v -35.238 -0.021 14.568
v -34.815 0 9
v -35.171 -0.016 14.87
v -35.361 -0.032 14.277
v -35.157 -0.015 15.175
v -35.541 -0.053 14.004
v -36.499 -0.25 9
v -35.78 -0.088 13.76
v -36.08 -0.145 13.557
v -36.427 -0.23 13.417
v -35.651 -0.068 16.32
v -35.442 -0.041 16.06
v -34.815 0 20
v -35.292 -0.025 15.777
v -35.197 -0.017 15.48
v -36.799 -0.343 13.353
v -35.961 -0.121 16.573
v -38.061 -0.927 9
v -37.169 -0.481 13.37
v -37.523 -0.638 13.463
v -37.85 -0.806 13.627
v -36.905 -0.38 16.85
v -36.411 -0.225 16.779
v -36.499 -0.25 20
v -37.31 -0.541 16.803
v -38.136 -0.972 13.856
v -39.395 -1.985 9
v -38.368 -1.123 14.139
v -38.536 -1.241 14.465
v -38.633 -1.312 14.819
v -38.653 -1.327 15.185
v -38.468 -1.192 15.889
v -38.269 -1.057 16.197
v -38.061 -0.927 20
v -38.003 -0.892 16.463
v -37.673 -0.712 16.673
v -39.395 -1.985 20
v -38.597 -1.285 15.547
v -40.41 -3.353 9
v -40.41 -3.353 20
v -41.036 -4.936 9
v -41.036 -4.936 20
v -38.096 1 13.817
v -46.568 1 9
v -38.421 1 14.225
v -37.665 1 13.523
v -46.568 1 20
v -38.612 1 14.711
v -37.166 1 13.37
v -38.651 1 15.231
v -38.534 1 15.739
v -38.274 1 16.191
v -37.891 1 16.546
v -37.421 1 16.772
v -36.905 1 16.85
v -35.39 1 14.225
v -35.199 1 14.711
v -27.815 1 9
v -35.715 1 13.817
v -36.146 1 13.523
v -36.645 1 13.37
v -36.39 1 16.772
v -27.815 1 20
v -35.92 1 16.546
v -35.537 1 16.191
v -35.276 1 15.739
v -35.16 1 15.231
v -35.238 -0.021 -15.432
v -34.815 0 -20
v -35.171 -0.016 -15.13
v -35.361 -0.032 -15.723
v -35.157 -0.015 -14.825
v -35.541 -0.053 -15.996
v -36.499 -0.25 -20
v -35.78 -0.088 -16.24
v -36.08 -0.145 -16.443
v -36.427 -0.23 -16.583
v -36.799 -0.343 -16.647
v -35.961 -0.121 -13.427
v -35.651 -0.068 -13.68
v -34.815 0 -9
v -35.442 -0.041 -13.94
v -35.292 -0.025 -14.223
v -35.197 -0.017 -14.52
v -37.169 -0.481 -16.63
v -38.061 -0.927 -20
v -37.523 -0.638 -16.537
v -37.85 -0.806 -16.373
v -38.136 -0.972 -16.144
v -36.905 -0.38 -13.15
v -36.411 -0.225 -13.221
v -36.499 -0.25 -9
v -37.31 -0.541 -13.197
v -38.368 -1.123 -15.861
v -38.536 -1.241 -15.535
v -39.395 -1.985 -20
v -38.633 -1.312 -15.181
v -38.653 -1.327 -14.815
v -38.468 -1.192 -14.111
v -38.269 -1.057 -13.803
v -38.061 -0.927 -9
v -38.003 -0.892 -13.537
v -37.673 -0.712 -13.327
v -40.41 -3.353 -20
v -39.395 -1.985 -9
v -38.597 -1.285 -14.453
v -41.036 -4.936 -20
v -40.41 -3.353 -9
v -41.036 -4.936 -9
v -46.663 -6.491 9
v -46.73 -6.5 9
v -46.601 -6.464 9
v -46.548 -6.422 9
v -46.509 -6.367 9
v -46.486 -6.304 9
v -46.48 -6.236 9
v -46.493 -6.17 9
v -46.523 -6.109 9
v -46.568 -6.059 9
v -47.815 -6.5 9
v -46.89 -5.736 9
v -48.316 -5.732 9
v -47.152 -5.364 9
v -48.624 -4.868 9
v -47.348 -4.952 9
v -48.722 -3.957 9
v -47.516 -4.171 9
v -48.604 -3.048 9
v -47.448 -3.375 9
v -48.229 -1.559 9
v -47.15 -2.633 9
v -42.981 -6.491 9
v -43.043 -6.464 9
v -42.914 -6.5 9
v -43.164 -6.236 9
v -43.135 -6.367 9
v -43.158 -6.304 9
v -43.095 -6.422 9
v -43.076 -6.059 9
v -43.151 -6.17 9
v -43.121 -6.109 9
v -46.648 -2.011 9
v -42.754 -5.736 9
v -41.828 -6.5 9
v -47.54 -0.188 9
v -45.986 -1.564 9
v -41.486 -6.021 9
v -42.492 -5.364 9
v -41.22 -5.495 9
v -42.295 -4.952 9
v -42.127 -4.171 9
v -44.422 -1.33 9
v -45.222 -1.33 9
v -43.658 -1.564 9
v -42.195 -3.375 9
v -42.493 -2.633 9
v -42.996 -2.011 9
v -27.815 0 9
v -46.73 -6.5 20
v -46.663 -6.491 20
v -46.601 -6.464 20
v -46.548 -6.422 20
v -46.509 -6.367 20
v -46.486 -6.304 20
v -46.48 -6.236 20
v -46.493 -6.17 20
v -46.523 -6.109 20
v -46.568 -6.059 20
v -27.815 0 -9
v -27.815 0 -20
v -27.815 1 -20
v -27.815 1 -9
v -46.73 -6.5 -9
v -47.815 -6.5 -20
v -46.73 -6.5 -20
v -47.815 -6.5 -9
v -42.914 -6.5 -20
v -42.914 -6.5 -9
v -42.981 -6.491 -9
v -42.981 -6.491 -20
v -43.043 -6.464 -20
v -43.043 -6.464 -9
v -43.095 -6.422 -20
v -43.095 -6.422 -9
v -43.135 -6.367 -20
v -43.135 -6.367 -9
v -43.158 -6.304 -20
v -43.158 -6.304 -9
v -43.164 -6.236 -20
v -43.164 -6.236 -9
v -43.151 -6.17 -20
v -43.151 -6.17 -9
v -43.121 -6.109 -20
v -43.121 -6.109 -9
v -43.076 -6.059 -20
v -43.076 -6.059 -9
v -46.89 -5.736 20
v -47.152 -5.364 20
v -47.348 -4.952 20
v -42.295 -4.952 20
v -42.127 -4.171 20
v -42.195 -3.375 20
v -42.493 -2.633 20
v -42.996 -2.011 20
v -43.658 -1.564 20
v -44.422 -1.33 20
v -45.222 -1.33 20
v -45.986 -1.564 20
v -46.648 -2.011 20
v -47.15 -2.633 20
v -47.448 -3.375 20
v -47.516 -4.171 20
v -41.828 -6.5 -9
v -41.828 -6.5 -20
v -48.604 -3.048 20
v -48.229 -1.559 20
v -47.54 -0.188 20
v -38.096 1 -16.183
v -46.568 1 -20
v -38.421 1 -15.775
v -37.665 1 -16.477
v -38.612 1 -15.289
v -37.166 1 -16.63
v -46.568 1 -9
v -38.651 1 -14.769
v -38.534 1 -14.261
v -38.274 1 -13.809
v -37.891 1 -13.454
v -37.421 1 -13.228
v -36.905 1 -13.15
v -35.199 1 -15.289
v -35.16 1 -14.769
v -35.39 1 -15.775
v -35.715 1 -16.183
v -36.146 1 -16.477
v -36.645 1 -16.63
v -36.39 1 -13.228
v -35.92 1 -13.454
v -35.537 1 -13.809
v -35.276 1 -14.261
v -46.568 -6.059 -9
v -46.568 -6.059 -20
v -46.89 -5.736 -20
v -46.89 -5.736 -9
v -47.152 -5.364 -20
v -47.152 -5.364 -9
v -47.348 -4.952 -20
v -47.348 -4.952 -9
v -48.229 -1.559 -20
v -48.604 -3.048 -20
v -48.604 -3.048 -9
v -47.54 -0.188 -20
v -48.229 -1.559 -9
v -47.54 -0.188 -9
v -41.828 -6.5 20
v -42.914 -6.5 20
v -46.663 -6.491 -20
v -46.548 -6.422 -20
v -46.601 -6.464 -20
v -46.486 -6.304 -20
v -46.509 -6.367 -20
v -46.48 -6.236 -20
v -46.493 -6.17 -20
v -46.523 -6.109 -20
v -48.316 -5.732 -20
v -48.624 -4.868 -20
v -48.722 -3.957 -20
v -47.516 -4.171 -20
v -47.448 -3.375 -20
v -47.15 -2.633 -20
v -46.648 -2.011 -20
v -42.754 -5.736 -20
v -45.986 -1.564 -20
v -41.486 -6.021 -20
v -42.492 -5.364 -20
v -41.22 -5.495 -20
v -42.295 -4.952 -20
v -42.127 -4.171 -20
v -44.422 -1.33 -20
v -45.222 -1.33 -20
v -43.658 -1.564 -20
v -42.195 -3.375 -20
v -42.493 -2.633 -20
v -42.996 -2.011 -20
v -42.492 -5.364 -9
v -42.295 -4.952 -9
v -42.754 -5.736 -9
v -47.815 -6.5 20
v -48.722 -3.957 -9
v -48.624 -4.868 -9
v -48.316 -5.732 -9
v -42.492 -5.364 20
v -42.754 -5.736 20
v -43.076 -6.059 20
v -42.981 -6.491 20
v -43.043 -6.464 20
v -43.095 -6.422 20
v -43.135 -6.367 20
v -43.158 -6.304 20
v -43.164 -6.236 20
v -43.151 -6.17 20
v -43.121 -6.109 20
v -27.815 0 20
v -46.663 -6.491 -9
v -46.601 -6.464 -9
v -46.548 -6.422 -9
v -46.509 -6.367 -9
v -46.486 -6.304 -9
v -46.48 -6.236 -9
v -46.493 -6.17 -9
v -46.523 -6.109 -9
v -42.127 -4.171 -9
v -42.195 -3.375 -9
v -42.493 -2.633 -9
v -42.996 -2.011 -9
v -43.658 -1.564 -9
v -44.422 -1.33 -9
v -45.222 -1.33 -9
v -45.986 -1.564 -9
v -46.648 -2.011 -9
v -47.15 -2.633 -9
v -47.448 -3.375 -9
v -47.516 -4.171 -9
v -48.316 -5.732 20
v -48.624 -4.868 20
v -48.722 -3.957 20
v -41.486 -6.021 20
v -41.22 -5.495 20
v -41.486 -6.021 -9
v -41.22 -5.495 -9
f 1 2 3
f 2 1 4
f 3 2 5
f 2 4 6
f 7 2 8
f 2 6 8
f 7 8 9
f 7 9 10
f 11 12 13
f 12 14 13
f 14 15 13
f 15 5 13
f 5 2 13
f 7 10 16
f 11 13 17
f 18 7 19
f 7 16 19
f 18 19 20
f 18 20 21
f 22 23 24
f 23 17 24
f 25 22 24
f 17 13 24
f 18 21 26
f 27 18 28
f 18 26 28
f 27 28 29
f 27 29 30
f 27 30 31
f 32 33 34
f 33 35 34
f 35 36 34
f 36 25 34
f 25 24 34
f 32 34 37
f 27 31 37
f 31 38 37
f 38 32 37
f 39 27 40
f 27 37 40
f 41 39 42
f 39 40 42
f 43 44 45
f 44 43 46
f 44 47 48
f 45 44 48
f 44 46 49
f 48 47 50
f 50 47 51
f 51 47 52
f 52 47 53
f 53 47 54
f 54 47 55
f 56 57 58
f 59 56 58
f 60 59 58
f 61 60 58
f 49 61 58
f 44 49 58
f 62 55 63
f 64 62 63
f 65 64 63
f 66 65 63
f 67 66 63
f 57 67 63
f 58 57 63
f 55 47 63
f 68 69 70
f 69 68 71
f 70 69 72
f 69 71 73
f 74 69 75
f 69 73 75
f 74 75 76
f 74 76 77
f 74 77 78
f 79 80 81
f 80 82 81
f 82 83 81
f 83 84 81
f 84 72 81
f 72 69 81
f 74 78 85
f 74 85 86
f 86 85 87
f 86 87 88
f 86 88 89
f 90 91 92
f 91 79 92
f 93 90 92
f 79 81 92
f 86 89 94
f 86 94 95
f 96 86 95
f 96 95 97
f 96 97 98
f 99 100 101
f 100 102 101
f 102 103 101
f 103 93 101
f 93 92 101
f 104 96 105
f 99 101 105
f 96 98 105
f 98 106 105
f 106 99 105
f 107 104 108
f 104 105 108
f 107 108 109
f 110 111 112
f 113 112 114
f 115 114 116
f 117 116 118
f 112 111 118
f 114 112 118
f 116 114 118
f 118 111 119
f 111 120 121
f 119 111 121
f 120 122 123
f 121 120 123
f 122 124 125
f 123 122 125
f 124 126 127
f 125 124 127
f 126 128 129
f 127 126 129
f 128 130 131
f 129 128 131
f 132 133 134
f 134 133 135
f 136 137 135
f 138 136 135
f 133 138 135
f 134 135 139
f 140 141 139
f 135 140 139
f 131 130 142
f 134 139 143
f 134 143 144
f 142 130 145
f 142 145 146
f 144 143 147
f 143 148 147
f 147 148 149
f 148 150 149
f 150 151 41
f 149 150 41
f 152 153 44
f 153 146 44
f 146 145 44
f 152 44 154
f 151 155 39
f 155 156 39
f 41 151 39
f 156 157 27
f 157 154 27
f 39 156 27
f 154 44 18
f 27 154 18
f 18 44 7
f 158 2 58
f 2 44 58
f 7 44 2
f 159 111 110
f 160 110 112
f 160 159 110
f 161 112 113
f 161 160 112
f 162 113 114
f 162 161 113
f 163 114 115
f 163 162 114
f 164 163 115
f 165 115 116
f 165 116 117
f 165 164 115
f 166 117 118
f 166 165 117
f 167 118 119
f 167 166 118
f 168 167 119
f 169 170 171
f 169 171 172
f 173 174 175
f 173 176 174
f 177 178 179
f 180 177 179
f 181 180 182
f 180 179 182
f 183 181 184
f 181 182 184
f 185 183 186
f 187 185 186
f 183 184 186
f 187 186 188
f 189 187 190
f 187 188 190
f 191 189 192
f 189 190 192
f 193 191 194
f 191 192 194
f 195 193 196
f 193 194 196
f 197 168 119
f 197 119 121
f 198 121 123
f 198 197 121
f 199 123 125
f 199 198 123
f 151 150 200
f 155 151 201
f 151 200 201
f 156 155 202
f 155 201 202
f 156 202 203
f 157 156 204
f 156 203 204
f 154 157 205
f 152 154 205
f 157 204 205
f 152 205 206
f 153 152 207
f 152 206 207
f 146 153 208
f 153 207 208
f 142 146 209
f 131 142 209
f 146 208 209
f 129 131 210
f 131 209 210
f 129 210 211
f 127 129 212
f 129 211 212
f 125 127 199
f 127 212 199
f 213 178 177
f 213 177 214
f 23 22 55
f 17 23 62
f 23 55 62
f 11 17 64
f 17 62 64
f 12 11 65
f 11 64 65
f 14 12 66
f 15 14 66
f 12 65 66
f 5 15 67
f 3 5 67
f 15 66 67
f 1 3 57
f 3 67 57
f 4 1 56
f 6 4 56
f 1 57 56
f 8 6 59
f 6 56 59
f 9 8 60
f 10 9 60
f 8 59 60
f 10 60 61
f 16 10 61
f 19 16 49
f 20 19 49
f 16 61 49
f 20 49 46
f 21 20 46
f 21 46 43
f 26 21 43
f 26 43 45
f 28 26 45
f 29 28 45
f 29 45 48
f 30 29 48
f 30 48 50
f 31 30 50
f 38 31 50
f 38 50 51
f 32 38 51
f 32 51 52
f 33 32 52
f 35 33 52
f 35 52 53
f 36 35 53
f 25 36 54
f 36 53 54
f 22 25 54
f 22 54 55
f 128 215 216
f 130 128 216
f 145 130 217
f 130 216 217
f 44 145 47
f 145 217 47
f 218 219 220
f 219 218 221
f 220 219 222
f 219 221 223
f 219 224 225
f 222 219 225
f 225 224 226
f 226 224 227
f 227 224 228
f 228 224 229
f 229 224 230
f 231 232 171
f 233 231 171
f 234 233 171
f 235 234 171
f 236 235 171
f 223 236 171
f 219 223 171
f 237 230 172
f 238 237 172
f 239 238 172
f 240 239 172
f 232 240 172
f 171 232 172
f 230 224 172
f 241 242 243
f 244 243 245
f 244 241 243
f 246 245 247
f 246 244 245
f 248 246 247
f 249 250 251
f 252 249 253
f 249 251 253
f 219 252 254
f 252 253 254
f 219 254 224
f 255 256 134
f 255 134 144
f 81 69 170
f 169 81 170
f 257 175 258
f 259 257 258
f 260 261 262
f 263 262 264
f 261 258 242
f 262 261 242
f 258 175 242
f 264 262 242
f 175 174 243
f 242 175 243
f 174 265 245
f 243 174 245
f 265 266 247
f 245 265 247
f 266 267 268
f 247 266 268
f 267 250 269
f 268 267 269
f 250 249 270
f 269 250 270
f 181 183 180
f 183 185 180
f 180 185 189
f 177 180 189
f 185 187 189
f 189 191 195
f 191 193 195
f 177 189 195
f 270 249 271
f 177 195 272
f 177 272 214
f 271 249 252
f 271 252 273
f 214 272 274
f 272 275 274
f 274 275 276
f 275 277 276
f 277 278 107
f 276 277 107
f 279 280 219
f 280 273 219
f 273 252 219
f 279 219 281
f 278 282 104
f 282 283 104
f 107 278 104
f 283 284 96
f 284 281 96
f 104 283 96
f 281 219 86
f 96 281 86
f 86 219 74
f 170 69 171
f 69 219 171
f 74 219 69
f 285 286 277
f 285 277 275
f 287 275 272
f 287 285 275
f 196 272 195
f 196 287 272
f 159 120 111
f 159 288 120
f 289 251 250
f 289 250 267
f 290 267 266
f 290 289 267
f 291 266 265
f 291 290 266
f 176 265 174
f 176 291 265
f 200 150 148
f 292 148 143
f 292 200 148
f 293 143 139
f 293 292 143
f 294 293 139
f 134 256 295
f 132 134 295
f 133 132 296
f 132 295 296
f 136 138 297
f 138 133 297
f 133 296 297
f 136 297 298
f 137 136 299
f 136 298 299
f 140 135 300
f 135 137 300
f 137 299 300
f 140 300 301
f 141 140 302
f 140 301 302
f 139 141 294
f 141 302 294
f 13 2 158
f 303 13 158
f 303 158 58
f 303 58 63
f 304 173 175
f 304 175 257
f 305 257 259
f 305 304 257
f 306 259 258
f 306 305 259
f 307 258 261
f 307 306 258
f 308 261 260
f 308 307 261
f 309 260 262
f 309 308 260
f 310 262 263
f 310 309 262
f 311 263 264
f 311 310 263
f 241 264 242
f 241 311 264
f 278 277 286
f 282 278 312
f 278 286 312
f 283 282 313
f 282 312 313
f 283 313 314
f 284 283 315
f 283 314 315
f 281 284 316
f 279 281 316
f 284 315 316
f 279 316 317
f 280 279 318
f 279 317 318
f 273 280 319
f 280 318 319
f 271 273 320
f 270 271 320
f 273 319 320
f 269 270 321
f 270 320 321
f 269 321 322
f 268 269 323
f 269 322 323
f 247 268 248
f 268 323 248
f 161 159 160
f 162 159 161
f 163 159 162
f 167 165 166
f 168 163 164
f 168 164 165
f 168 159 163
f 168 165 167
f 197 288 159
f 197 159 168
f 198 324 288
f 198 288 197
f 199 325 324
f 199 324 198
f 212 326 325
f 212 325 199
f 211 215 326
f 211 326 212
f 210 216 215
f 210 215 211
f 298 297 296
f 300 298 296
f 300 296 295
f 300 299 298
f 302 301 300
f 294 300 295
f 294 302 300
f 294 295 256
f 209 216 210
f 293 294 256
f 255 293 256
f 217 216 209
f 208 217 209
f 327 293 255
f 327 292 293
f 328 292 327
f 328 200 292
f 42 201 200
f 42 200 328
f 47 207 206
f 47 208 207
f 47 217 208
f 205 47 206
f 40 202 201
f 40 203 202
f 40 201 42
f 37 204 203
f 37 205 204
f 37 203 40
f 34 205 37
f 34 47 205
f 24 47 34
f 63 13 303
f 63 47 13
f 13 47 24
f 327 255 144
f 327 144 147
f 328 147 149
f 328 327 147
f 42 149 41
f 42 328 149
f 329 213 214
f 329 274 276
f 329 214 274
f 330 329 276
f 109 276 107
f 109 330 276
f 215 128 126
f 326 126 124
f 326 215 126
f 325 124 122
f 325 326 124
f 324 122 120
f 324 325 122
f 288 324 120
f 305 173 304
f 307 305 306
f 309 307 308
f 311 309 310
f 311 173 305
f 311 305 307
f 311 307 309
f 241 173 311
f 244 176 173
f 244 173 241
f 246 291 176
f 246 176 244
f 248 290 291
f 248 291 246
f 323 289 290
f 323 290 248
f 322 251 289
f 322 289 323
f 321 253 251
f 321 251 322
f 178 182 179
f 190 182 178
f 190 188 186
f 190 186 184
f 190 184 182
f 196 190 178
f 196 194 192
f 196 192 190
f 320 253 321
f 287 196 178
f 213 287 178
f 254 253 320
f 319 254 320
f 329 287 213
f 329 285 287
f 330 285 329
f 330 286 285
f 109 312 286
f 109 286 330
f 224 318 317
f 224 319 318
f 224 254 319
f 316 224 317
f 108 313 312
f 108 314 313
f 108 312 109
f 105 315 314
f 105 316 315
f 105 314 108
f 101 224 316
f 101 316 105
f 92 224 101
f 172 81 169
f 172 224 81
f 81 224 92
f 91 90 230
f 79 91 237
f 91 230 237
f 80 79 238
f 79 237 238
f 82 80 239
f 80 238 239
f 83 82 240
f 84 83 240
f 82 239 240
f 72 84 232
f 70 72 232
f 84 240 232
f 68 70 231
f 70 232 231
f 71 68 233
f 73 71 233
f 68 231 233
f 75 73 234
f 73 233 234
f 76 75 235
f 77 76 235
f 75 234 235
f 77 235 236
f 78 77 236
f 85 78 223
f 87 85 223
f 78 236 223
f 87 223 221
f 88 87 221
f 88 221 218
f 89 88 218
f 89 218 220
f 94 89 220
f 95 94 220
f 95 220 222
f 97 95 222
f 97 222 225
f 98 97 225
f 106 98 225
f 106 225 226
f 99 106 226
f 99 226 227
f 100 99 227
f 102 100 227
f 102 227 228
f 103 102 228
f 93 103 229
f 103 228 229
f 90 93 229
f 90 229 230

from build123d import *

# Parameters (mm, degrees)
EXTRUDE_1_DEPTH                            = 3.9
EXTRUDE_3_DEPTH                            = 20
EXTRUDE_5_DEPTH                            = 20
FILLET_1_R                                 = 0.25
FILLET_1_OF_MIRROR_2_R                     = 0.25
SKETCH_7_R                                 = 5.5
CUT_EXTRUDE_3_DEPTH                        = 69.146236458
MIRROR_3_AT_THE_SECOND_PLANE_COPY_1_SKET_R = 5.5
MIRROR_3_AT_THE_SECOND_PLANE_COPY_1_DEPTH  = 69.146236458
ESQUISSE1_W                                = 44.6
ESQUISSE1_H                                = 40
ENL_V_MAT_EXTRU_1_DEPTH                    = 1.54
ENL_V_MAT_EXTRU_2_DEPTH                    = 57.761068742
ESQUISSE3_W                                = 50
ESQUISSE3_H                                = 1.36
ENL_V_MAT_EXTRU_3_DEPTH                    = 64.372466761
ESQUISSE4_W                                = 27.815449133
ESQUISSE4_H                                = 40
ENL_V_MAT_EXTRU_4_DEPTH                    = 54.066651895
ESQUISSE5_R                                = 1.75
ENL_V_MAT_EXTRU_5_DEPTH                    = 54.198396436
ESQUISSE6_W                                = 25
ESQUISSE6_H                                = 18
ENL_V_MAT_EXTRU_6_DEPTH                    = 54.198396473


with BuildPart() as part:
    # Эскиз1 → Бобышка-Вытянуть1 (new body)
    with BuildSketch(Plane(origin=(0, 0, 0), x_dir=(1, 0, 0), z_dir=(0, 1, 0))):
        with BuildLine():
            ThreePointArc((-44.6, -23.2), (-43.428427125, -26.028427125), (-40.6, -27.2))
            Line((-40.6, -27.2), (40.6, -27.2))
            ThreePointArc((40.6, -27.2), (43.428427125, -26.028427125), (44.6, -23.2))
            Line((44.6, -23.2), (44.6, 23.2))
            ThreePointArc((44.6, 23.2), (43.428427125, 26.028427125), (40.6, 27.2))
            Line((40.6, 27.2), (33.6, 27.2))
            Line((33.6, 27.2), (-5.4, 27.2))
            Line((-5.4, 27.2), (-40.6, 27.2))
            ThreePointArc((-40.6, 27.2), (-43.428427125, 26.028427125), (-44.6, 23.2))
            Line((-44.6, 23.2), (-44.6, -23.2))
        make_face()
    extrude(amount=EXTRUDE_1_DEPTH)



with BuildPart() as body_2:
    # Эскиз3 → Бобышка-Вытянуть3 (new, symmetric)
    with BuildSketch(Plane.XY):
        with BuildLine():
            Line((-47.815262386, -6.499919999), (-45.841869662, -6.499919999))
            ThreePointArc((-45.841869662, -6.499919999), (-44.821869662, -1.3), (-43.801869662, -6.499919999))
            Line((-43.801869662, -6.499919999), (-41.828476938, -6.499919999))
            ThreePointArc((-41.828476938, -6.499919999), (-44.821869662, -0.1), (-47.815262386, -6.499919999))
        make_face()
    extrude_3 = extrude(amount=EXTRUDE_3_DEPTH, both=True)


with BuildPart() as part_1:
    add(part.part)

    add(body_2.part)  # Бобышка-Вытянуть5 merges body 2
    # Эскиз5 → Бобышка-Вытянуть5 (add, symmetric)
    with BuildSketch(Plane.XY):
        with BuildLine():
            ThreePointArc((-41.631827579, 2.999901942), (-46.932438451, 0.61464415), (-48.60377877, -4.952451312))
            Line((-48.60377877, -4.952451312), (-47.348297278, -4.952451312))
            ThreePointArc((-47.348297278, -4.952451312), (-44.821869662, -1.3), (-42.295442046, -4.952451312))
            Line((-42.295442046, -4.952451312), (-41.039960555, -4.952451312))
            ThreePointArc((-41.039960555, -4.952451312), (-38.684888017, -1.351535806), (-34.6, 0))
            Line((-34.6, 0), (-36.641600827, 0.870983001))
            ThreePointArc((-36.641600827, 0.870983001), (-38.922074934, 2.438561027), (-41.631827579, 2.999901942))
        make_face()
    extrude_5 = extrude(amount=EXTRUDE_5_DEPTH, both=True)

    # Скругление1
    fillet_1_edges = [part_1.edges().sort_by_distance(p)[0] for p in [
        (-43.801869662, -6.499919999, 0),
        (-45.841869662, -6.499919999, 0),
    ]]
    fillet(fillet_1_edges, radius=FILLET_1_R)

    # Зеркальное отражение1: Бобышка-Вытянуть5 across plane
    add(extrude_5.mirror(Plane(origin=(0, 0, 0), x_dir=(0, 0, 1), z_dir=(1, 0, 0))))

    # Зеркальное отражение2: Бобышка-Вытянуть3 across plane
    add(extrude_3.mirror(Plane(origin=(0, 0, 0), x_dir=(0, 0, 1), z_dir=(1, 0, 0))))

    # Скругление1 of Зеркальное отражение2
    fillet_1_of_mirror_2_edges = [part_1.edges().sort_by_distance(p)[0] for p in [
        (43.801869662, -6.499919999, 0),
        (45.841869662, -6.499919999, 0),
    ]]
    fillet(fillet_1_of_mirror_2_edges, radius=FILLET_1_OF_MIRROR_2_R)

    # Эскиз7 → Вырез-Вытянуть3 (cut, through all)
    with BuildSketch(Plane.XY.offset(20)):
        with Locations((-45, -4)):
            Circle(SKETCH_7_R)
    cut_extrude_3 = extrude(amount=CUT_EXTRUDE_3_DEPTH, mode=Mode.SUBTRACT)

    # Зеркальное отражение3: Вырез-Вытянуть3 across plane
    add(cut_extrude_3.mirror(Plane(origin=(0, 0, 0), x_dir=(0, 0, 1), z_dir=(1, 0, 0))), mode=Mode.SUBTRACT)

    # Зеркальное отражение3 at the second plane: Вырез-Вытянуть3 across plane
    add(cut_extrude_3.mirror(Plane.XY), mode=Mode.SUBTRACT)

    # Зеркальное отражение3 at the second plane copy 1 sket → Зеркальное отражение3 at the second plane copy 1 (cut, through all)
    with BuildSketch(Plane(origin=(0, 0, -20), x_dir=(-1, 0, 0), z_dir=(0, 0, -1))):
        with Locations((-45, -4)):
            Circle(MIRROR_3_AT_THE_SECOND_PLANE_COPY_1_SKET_R)
    extrude(amount=MIRROR_3_AT_THE_SECOND_PLANE_COPY_1_DEPTH, mode=Mode.SUBTRACT)

    # Esquisse1 → Enlèv. mat.-Extru.1 (cut)
    with BuildSketch(Plane(origin=(0, 3.9, 0), x_dir=(1, 0, 0), z_dir=(0, 1, 0))):
        with Locations((-22.3, 0)):
            Rectangle(ESQUISSE1_W, ESQUISSE1_H)
    extrude(amount=-ENL_V_MAT_EXTRU_1_DEPTH, mode=Mode.SUBTRACT)

    # Esquisse2 → Enlèv. mat.-Extru.2 (cut, through all)
    with BuildSketch(Plane(origin=(0, 3.9, 0), x_dir=(1, 0, 0), z_dir=(0, 1, 0))):
        Polygon((-44.6, 20), (-44.6, 27.2), (51.6, 27.2), (51.6, -27.2), (-44.6, -27.2), (-44.6, -20), (0, -20), (0, 20), align=None)
    extrude(amount=-ENL_V_MAT_EXTRU_2_DEPTH, mode=Mode.SUBTRACT)

    # Esquisse3 → Enlèv. mat.-Extru.3 (cut, through all)
    with BuildSketch(Plane.XY.offset(20)):
        with Locations((-25, 1.68)):
            Rectangle(ESQUISSE3_W, ESQUISSE3_H)
    extrude(amount=-ENL_V_MAT_EXTRU_3_DEPTH, mode=Mode.SUBTRACT)

    # Esquisse4 → Enlèv. mat.-Extru.4 (cut, through all)
    with BuildSketch(Plane.XZ):
        with Locations((-13.907724567, 0)):
            Rectangle(ESQUISSE4_W, ESQUISSE4_H)
    extrude(amount=-ENL_V_MAT_EXTRU_4_DEPTH, mode=Mode.SUBTRACT)

    # Esquisse5 → Enlèv. mat.-Extru.5 (cut, through all)
    with BuildSketch(Plane(origin=(0, 1, 0), x_dir=(1, 0, 0), z_dir=(0, 1, 0))):
        with Locations((-36.905449133, 14.9)):
            Circle(ESQUISSE5_R)
        with Locations((-36.905449133, -15.1)):
            Circle(ESQUISSE5_R)
    extrude(amount=-ENL_V_MAT_EXTRU_5_DEPTH, mode=Mode.SUBTRACT)

    # Esquisse6 → Enlèv. mat.-Extru.6 (cut, through all)
    with BuildSketch(Plane(origin=(0, 1, 0), x_dir=(1, 0, 0), z_dir=(0, 1, 0))):
        with Locations((-40.315449133, 0)):
            Rectangle(ESQUISSE6_W, ESQUISSE6_H)
    extrude(amount=-ENL_V_MAT_EXTRU_6_DEPTH, mode=Mode.SUBTRACT)


with BuildPart() as enl_v_mat_extru_6_piece_1:
    # of the separate pieces the step leaves, piece 1, a body of its own (enl_v_mat_extru_6_pieces)
    add(part_1.part.solids().sort_by_distance((-42.913896916, -6.499919999, -20))[0])


with BuildPart() as enl_v_mat_extru_6_piece_2:
    # of the separate pieces the step leaves, piece 2, a body of its own (enl_v_mat_extru_6_pieces)
    add(part_1.part.solids().sort_by_distance((-42.913896916, -6.499919999, 20))[0])


solid = Compound([enl_v_mat_extru_6_piece_1.part, enl_v_mat_extru_6_piece_2.part])
